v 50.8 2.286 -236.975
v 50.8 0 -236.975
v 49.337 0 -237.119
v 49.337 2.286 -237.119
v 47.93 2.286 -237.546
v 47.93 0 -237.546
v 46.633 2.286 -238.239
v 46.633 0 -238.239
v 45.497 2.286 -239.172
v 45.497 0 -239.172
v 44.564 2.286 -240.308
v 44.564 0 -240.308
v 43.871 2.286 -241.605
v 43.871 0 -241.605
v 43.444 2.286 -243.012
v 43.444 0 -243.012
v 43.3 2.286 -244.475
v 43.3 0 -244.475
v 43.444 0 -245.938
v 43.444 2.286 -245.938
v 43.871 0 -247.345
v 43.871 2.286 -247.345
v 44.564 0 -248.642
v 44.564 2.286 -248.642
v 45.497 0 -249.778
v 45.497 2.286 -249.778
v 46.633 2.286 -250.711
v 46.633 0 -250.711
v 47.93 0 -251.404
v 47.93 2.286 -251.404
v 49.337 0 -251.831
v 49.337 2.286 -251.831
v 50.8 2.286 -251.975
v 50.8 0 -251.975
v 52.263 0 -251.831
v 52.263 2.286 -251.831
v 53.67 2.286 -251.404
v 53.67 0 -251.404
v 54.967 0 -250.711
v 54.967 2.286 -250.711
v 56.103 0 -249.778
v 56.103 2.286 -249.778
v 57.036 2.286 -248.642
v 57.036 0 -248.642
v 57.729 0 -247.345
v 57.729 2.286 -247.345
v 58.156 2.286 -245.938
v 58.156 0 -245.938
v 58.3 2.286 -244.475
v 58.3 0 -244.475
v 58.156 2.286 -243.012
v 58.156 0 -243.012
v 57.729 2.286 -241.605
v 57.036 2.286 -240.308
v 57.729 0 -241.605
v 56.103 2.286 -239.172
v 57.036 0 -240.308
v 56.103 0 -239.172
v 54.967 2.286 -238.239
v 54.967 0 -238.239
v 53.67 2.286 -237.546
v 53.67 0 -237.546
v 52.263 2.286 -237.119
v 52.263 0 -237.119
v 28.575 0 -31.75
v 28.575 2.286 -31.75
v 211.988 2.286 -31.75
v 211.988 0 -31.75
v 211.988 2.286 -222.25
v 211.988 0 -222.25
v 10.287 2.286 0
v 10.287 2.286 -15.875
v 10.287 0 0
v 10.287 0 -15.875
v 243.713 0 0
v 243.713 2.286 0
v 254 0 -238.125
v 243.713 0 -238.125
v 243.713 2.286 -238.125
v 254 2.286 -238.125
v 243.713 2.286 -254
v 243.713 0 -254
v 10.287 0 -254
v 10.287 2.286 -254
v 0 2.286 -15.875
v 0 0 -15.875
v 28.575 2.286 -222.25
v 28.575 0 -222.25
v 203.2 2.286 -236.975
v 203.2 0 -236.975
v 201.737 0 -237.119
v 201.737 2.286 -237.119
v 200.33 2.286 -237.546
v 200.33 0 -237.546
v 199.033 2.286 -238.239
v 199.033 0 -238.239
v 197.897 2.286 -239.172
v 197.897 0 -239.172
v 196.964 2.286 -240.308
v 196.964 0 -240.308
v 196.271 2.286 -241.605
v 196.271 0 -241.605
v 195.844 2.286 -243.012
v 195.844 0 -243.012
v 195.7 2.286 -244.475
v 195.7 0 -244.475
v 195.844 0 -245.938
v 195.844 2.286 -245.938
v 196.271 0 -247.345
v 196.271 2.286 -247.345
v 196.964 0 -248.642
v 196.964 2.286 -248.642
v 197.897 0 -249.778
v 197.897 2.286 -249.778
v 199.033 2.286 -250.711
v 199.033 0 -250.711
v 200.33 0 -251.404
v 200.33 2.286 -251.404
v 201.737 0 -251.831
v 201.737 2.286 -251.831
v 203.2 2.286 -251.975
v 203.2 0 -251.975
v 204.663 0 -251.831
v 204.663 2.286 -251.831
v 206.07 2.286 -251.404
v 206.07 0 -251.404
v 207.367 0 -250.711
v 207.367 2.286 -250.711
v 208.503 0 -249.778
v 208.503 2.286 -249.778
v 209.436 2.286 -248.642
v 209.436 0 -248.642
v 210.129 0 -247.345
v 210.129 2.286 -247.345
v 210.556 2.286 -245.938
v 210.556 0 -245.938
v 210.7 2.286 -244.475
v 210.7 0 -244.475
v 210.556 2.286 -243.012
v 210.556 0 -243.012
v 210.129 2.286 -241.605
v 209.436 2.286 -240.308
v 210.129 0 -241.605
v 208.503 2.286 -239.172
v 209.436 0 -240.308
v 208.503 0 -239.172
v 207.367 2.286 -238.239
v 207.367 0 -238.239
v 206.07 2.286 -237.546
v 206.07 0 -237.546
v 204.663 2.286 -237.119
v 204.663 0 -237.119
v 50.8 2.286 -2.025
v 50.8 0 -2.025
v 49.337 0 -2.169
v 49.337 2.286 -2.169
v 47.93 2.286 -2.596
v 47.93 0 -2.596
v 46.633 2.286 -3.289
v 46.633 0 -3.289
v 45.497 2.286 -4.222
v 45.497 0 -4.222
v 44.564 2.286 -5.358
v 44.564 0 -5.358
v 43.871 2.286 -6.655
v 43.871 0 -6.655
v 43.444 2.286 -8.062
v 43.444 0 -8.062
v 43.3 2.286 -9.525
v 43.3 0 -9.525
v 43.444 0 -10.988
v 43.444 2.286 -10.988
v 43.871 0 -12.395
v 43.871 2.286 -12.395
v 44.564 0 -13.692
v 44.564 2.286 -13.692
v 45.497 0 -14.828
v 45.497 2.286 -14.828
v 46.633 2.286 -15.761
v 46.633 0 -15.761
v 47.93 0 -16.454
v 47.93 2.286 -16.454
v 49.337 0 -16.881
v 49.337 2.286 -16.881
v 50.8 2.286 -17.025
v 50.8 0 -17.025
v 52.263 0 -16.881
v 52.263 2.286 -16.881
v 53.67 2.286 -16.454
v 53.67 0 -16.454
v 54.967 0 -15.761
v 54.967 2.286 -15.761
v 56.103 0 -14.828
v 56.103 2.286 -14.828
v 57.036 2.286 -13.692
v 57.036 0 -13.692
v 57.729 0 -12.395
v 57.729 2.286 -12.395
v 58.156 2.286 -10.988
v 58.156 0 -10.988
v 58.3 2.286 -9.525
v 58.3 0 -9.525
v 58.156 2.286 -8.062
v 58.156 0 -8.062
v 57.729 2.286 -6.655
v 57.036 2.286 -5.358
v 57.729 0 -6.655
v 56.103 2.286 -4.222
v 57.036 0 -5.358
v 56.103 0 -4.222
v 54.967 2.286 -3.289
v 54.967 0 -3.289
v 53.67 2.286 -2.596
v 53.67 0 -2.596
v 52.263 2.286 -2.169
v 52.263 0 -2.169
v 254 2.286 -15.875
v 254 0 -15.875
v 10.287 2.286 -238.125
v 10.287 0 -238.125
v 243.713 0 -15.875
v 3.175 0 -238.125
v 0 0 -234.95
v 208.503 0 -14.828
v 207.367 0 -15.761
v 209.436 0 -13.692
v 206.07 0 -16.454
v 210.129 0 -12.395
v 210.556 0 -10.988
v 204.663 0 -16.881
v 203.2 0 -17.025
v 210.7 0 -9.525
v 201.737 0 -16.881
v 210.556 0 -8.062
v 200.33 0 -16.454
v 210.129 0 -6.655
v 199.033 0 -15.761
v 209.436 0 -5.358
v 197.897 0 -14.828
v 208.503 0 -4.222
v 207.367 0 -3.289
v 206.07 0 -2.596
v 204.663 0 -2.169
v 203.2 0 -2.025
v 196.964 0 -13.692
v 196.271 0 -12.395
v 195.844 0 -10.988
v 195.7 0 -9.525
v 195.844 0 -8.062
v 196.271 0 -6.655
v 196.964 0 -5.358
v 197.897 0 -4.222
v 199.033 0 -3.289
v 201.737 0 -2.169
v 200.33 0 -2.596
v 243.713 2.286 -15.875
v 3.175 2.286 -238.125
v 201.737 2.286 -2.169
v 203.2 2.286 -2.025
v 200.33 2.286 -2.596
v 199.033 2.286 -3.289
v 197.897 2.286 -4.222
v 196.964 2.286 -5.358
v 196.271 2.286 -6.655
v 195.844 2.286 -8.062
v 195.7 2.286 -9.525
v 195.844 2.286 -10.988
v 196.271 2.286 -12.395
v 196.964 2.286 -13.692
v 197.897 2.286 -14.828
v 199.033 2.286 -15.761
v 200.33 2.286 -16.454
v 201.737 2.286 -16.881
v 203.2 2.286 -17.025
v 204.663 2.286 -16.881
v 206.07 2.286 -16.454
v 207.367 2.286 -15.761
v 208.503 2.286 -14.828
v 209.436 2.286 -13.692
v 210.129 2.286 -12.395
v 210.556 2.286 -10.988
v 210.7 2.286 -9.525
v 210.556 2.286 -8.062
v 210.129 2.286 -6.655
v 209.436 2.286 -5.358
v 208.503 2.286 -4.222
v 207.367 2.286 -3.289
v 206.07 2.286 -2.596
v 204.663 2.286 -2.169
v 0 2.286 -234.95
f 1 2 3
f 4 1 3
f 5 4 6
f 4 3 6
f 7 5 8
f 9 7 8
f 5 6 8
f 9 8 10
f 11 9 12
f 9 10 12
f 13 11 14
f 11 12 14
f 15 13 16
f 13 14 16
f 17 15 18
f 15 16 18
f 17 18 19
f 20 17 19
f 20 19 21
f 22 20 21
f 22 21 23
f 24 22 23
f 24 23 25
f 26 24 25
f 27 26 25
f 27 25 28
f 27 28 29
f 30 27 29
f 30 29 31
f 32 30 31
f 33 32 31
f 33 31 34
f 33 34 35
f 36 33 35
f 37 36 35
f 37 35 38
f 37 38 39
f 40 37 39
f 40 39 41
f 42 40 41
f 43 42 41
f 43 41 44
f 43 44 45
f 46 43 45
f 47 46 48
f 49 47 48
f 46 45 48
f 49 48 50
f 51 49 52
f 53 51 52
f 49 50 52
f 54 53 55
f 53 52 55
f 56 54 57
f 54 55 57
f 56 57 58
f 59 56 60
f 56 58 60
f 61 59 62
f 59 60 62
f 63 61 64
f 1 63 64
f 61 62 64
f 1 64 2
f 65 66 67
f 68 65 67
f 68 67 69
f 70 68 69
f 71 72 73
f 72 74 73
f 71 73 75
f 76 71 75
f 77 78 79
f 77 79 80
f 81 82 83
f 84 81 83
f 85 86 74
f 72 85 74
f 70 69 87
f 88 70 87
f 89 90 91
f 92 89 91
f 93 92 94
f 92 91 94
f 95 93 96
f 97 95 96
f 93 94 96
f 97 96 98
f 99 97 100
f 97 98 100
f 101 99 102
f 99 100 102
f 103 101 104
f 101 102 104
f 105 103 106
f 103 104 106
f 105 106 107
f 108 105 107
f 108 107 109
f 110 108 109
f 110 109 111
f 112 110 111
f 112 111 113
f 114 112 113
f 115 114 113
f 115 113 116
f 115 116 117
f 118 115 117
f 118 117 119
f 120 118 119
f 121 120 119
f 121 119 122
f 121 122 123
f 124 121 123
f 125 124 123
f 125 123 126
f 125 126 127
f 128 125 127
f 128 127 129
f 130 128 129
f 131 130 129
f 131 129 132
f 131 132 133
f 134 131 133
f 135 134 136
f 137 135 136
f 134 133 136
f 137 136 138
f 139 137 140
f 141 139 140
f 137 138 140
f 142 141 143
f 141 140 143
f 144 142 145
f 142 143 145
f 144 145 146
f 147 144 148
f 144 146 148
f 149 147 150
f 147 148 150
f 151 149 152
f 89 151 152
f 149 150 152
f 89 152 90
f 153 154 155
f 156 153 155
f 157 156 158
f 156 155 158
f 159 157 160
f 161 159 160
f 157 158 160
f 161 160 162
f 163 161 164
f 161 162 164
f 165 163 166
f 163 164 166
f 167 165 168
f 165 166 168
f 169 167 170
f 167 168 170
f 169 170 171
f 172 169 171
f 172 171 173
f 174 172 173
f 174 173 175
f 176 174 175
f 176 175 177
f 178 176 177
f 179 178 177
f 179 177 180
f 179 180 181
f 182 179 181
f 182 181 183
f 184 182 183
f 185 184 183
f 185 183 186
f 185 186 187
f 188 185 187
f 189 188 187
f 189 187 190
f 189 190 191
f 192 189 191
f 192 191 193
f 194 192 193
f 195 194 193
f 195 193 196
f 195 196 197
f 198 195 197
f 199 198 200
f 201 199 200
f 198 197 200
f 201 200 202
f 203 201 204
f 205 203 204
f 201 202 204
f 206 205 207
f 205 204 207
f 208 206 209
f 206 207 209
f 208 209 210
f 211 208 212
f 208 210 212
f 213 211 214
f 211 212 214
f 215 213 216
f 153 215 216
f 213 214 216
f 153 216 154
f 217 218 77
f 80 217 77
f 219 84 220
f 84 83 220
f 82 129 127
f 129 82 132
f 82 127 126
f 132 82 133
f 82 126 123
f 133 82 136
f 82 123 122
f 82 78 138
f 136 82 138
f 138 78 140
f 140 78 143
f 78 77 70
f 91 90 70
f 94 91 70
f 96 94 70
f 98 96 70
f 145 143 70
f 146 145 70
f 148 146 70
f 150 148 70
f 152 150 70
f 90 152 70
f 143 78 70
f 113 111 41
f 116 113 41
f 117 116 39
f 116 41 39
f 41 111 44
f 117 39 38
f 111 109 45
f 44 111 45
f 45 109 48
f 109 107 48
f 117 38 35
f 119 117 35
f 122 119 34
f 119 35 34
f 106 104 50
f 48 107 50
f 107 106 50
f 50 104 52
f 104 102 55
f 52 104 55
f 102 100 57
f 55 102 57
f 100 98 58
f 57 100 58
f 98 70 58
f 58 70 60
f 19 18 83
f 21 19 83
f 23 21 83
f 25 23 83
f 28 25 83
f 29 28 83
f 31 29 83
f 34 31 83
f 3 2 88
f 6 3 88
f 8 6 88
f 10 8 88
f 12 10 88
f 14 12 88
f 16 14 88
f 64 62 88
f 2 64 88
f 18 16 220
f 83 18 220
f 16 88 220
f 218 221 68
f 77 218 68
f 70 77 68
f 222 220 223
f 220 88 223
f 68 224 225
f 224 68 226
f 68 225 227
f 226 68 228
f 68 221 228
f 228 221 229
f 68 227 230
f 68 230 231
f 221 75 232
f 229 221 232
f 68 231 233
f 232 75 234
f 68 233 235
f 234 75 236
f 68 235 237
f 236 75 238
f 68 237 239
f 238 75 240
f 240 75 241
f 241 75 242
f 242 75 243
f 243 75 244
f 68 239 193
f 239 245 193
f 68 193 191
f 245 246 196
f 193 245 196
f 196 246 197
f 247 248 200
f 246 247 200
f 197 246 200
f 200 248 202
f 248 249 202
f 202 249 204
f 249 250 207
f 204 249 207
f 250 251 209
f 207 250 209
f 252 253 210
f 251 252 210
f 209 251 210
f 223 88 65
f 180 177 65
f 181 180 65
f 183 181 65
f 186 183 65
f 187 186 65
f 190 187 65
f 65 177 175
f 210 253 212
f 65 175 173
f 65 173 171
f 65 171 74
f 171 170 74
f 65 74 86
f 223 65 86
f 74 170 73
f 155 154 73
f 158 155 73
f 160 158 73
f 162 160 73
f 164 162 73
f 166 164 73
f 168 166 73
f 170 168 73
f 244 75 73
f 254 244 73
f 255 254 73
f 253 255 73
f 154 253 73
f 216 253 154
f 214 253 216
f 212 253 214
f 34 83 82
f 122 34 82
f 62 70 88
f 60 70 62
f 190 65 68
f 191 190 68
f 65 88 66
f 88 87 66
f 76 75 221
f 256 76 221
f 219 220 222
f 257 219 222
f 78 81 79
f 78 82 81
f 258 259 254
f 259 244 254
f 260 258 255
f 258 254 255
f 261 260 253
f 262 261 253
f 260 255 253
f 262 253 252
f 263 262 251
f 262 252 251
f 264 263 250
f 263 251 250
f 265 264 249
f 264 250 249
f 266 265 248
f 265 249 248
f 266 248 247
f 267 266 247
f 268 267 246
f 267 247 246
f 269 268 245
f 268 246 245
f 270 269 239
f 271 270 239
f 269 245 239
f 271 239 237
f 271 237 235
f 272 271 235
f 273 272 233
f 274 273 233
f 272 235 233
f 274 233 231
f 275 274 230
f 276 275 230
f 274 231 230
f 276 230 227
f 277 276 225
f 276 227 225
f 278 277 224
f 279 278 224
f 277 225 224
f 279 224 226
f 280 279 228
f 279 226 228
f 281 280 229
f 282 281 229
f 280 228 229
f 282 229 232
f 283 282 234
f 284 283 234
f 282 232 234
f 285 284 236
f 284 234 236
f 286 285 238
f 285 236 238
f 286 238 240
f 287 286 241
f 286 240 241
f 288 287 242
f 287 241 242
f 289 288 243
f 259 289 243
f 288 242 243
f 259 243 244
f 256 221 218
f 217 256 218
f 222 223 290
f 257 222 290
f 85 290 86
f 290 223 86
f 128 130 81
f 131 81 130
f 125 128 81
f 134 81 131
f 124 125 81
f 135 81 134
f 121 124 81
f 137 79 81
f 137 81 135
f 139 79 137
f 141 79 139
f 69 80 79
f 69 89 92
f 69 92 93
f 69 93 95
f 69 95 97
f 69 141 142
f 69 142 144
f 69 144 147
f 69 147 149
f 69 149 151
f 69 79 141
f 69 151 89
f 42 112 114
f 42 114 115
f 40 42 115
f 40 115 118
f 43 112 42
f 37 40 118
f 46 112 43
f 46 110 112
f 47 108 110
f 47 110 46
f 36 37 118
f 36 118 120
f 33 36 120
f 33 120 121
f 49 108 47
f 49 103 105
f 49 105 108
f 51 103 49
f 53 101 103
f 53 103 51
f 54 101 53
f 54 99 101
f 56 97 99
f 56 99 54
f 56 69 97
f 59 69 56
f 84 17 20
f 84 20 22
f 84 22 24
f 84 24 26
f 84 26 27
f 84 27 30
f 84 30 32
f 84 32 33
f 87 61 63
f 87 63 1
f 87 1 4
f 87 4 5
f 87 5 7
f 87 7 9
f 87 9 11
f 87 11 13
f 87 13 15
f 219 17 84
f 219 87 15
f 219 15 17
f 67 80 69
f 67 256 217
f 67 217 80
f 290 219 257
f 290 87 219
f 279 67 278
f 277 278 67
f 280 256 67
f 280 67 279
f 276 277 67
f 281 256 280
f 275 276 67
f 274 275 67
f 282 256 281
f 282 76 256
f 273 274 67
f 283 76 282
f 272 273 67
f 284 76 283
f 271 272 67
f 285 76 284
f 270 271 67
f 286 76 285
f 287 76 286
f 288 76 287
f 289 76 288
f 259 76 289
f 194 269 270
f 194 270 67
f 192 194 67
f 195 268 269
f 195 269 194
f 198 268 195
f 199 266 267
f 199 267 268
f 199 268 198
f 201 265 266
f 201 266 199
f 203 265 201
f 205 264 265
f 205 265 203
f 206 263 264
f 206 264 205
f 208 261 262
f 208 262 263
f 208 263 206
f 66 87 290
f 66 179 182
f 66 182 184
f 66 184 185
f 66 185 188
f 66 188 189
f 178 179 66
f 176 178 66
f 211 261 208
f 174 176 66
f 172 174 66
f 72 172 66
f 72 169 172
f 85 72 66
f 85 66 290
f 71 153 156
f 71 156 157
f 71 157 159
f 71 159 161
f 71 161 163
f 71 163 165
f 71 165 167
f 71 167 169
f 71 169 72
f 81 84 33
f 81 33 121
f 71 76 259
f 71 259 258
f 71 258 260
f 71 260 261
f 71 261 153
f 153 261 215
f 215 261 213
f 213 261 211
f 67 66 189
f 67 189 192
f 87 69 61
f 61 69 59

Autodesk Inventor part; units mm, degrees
ref_plane "YZ Plane" through (0, 0, 0) normal (1, 0, 0) x (0, 1, 0)
ref_plane "XZ Plane" through (0, 0, 0) normal (0, 1, 0) x (-1, 0, 0)
ref_plane "XY Plane" through (0, 0, 0) normal (0, 0, 1) x (1, 0, 0)
sketch "Sketch1" plane through (0, 0, 0) normal (0, 1, 0) x (-1, 0, 0)
  line L0 (0, 0) -> (-254, 0)
  line L1 (-254, 0) -> (-254, -254)
  line L2 (-254, -254) -> (0, -254)
  line L3 (0, -254) -> (0, 0)
  line L4 (0, -15.875) -> (-10.287, -15.875)
  line L5 (-10.287, -15.875) -> (-10.287, 0)
  line L6 (-243.713, 0) -> (-243.713, -15.875)
  line L7 (-243.713, -15.875) -> (-254, -15.875)
  line L8 (-243.713, -254) -> (-243.713, -238.125)
  line L9 (-243.713, -238.125) -> (-254, -238.125)
  line L10 (-10.287, -254) -> (-10.287, -238.125)
  line L11 (-10.287, -238.125) -> (0, -238.125)
  dimension "d0" = 254
  dimension "d1" = 254
  dimension "d14" = 10.287
  dimension "d15" = 10.287
  dimension "d16" = 15.875
  dimension "d17" = 15.875
extrude "Extrusion1" add sketch "Sketch1" along normal blind 2.286 contours L5 L4 L3 L11 L10 L2 L8 L9 L1 L7 L6 L0
sketch "Sketch2" plane through (0, 2.286, 0) normal (0, 1, 0) x (1, 0, 0)
  line L0 (28.575, 31.75) -> (211.9884, 31.75)
  line L1 (211.9884, 31.75) -> (211.9884, 222.25)
  line L2 (211.9884, 222.25) -> (28.575, 222.25)
  line L3 (28.575, 222.25) -> (28.575, 31.75)
  line L4 (0, 15.875) -> (10.287, 15.875) projected
  line L5 (10.287, 15.875) -> (10.287, 0) projected
  line L6 (10.287, 0) -> (243.713, 0) projected
  line L7 (243.713, 0) -> (243.713, 15.875) projected
  line L8 (243.713, 15.875) -> (254, 15.875) projected
  line L9 (254, 15.875) -> (254, 238.125) projected
  line L10 (254, 238.125) -> (243.713, 238.125) projected
  line L11 (243.713, 238.125) -> (243.713, 254) projected
  line L12 (243.713, 254) -> (10.287, 254) projected
  line L13 (10.287, 254) -> (10.287, 238.125) projected
  line L14 (10.287, 238.125) -> (0, 238.125) projected
  line L15 (0, 238.125) -> (0, 15.875) projected
  line L16 (0, 238.125) -> (0, 15.875) projected
  point P0 (0, 0)
  point P1 (127, 0)
  point P2 (0, 127)
  point P3 (28.575, 127)
  point P4 (0, 127)
  dimension "d9" = 190.5
  dimension "d28" = 42.0116
  dimension "d29" = 28.575
extrude "Extrusion2" cut sketch "Sketch2" against normal through all contours L3 L2 L1 L0
sketch "Sketch3" plane through (0, 2.286, 0) normal (0, 1, 0) x (1, 0, 0)
  circle A0 centre (50.8, 9.525) radius 4 projected
  circle A1 centre (203.2, 9.525) radius 4 projected
  circle A2 centre (203.2, 244.475) radius 4.2037 projected
  circle A3 centre (50.8, 244.475) radius 4.2037 projected
  point P0 (0, 0)
hole "Hole1" at (50.8, 2.286, -9.525) at (50.8, 2.286, -244.475) at (203.2, 2.286, -244.475) at (203.2, 2.286, -9.525) direction (0, -1, 0) diameter 15 end through all
chamfer "Chamfer1" distance 3.175 angle 45 1 edges at (0, 1.143, -238.125)
equation "\"d15\" = d14"
equation "\"d17\" = d16"
properties part number "Carriage Sheet"
